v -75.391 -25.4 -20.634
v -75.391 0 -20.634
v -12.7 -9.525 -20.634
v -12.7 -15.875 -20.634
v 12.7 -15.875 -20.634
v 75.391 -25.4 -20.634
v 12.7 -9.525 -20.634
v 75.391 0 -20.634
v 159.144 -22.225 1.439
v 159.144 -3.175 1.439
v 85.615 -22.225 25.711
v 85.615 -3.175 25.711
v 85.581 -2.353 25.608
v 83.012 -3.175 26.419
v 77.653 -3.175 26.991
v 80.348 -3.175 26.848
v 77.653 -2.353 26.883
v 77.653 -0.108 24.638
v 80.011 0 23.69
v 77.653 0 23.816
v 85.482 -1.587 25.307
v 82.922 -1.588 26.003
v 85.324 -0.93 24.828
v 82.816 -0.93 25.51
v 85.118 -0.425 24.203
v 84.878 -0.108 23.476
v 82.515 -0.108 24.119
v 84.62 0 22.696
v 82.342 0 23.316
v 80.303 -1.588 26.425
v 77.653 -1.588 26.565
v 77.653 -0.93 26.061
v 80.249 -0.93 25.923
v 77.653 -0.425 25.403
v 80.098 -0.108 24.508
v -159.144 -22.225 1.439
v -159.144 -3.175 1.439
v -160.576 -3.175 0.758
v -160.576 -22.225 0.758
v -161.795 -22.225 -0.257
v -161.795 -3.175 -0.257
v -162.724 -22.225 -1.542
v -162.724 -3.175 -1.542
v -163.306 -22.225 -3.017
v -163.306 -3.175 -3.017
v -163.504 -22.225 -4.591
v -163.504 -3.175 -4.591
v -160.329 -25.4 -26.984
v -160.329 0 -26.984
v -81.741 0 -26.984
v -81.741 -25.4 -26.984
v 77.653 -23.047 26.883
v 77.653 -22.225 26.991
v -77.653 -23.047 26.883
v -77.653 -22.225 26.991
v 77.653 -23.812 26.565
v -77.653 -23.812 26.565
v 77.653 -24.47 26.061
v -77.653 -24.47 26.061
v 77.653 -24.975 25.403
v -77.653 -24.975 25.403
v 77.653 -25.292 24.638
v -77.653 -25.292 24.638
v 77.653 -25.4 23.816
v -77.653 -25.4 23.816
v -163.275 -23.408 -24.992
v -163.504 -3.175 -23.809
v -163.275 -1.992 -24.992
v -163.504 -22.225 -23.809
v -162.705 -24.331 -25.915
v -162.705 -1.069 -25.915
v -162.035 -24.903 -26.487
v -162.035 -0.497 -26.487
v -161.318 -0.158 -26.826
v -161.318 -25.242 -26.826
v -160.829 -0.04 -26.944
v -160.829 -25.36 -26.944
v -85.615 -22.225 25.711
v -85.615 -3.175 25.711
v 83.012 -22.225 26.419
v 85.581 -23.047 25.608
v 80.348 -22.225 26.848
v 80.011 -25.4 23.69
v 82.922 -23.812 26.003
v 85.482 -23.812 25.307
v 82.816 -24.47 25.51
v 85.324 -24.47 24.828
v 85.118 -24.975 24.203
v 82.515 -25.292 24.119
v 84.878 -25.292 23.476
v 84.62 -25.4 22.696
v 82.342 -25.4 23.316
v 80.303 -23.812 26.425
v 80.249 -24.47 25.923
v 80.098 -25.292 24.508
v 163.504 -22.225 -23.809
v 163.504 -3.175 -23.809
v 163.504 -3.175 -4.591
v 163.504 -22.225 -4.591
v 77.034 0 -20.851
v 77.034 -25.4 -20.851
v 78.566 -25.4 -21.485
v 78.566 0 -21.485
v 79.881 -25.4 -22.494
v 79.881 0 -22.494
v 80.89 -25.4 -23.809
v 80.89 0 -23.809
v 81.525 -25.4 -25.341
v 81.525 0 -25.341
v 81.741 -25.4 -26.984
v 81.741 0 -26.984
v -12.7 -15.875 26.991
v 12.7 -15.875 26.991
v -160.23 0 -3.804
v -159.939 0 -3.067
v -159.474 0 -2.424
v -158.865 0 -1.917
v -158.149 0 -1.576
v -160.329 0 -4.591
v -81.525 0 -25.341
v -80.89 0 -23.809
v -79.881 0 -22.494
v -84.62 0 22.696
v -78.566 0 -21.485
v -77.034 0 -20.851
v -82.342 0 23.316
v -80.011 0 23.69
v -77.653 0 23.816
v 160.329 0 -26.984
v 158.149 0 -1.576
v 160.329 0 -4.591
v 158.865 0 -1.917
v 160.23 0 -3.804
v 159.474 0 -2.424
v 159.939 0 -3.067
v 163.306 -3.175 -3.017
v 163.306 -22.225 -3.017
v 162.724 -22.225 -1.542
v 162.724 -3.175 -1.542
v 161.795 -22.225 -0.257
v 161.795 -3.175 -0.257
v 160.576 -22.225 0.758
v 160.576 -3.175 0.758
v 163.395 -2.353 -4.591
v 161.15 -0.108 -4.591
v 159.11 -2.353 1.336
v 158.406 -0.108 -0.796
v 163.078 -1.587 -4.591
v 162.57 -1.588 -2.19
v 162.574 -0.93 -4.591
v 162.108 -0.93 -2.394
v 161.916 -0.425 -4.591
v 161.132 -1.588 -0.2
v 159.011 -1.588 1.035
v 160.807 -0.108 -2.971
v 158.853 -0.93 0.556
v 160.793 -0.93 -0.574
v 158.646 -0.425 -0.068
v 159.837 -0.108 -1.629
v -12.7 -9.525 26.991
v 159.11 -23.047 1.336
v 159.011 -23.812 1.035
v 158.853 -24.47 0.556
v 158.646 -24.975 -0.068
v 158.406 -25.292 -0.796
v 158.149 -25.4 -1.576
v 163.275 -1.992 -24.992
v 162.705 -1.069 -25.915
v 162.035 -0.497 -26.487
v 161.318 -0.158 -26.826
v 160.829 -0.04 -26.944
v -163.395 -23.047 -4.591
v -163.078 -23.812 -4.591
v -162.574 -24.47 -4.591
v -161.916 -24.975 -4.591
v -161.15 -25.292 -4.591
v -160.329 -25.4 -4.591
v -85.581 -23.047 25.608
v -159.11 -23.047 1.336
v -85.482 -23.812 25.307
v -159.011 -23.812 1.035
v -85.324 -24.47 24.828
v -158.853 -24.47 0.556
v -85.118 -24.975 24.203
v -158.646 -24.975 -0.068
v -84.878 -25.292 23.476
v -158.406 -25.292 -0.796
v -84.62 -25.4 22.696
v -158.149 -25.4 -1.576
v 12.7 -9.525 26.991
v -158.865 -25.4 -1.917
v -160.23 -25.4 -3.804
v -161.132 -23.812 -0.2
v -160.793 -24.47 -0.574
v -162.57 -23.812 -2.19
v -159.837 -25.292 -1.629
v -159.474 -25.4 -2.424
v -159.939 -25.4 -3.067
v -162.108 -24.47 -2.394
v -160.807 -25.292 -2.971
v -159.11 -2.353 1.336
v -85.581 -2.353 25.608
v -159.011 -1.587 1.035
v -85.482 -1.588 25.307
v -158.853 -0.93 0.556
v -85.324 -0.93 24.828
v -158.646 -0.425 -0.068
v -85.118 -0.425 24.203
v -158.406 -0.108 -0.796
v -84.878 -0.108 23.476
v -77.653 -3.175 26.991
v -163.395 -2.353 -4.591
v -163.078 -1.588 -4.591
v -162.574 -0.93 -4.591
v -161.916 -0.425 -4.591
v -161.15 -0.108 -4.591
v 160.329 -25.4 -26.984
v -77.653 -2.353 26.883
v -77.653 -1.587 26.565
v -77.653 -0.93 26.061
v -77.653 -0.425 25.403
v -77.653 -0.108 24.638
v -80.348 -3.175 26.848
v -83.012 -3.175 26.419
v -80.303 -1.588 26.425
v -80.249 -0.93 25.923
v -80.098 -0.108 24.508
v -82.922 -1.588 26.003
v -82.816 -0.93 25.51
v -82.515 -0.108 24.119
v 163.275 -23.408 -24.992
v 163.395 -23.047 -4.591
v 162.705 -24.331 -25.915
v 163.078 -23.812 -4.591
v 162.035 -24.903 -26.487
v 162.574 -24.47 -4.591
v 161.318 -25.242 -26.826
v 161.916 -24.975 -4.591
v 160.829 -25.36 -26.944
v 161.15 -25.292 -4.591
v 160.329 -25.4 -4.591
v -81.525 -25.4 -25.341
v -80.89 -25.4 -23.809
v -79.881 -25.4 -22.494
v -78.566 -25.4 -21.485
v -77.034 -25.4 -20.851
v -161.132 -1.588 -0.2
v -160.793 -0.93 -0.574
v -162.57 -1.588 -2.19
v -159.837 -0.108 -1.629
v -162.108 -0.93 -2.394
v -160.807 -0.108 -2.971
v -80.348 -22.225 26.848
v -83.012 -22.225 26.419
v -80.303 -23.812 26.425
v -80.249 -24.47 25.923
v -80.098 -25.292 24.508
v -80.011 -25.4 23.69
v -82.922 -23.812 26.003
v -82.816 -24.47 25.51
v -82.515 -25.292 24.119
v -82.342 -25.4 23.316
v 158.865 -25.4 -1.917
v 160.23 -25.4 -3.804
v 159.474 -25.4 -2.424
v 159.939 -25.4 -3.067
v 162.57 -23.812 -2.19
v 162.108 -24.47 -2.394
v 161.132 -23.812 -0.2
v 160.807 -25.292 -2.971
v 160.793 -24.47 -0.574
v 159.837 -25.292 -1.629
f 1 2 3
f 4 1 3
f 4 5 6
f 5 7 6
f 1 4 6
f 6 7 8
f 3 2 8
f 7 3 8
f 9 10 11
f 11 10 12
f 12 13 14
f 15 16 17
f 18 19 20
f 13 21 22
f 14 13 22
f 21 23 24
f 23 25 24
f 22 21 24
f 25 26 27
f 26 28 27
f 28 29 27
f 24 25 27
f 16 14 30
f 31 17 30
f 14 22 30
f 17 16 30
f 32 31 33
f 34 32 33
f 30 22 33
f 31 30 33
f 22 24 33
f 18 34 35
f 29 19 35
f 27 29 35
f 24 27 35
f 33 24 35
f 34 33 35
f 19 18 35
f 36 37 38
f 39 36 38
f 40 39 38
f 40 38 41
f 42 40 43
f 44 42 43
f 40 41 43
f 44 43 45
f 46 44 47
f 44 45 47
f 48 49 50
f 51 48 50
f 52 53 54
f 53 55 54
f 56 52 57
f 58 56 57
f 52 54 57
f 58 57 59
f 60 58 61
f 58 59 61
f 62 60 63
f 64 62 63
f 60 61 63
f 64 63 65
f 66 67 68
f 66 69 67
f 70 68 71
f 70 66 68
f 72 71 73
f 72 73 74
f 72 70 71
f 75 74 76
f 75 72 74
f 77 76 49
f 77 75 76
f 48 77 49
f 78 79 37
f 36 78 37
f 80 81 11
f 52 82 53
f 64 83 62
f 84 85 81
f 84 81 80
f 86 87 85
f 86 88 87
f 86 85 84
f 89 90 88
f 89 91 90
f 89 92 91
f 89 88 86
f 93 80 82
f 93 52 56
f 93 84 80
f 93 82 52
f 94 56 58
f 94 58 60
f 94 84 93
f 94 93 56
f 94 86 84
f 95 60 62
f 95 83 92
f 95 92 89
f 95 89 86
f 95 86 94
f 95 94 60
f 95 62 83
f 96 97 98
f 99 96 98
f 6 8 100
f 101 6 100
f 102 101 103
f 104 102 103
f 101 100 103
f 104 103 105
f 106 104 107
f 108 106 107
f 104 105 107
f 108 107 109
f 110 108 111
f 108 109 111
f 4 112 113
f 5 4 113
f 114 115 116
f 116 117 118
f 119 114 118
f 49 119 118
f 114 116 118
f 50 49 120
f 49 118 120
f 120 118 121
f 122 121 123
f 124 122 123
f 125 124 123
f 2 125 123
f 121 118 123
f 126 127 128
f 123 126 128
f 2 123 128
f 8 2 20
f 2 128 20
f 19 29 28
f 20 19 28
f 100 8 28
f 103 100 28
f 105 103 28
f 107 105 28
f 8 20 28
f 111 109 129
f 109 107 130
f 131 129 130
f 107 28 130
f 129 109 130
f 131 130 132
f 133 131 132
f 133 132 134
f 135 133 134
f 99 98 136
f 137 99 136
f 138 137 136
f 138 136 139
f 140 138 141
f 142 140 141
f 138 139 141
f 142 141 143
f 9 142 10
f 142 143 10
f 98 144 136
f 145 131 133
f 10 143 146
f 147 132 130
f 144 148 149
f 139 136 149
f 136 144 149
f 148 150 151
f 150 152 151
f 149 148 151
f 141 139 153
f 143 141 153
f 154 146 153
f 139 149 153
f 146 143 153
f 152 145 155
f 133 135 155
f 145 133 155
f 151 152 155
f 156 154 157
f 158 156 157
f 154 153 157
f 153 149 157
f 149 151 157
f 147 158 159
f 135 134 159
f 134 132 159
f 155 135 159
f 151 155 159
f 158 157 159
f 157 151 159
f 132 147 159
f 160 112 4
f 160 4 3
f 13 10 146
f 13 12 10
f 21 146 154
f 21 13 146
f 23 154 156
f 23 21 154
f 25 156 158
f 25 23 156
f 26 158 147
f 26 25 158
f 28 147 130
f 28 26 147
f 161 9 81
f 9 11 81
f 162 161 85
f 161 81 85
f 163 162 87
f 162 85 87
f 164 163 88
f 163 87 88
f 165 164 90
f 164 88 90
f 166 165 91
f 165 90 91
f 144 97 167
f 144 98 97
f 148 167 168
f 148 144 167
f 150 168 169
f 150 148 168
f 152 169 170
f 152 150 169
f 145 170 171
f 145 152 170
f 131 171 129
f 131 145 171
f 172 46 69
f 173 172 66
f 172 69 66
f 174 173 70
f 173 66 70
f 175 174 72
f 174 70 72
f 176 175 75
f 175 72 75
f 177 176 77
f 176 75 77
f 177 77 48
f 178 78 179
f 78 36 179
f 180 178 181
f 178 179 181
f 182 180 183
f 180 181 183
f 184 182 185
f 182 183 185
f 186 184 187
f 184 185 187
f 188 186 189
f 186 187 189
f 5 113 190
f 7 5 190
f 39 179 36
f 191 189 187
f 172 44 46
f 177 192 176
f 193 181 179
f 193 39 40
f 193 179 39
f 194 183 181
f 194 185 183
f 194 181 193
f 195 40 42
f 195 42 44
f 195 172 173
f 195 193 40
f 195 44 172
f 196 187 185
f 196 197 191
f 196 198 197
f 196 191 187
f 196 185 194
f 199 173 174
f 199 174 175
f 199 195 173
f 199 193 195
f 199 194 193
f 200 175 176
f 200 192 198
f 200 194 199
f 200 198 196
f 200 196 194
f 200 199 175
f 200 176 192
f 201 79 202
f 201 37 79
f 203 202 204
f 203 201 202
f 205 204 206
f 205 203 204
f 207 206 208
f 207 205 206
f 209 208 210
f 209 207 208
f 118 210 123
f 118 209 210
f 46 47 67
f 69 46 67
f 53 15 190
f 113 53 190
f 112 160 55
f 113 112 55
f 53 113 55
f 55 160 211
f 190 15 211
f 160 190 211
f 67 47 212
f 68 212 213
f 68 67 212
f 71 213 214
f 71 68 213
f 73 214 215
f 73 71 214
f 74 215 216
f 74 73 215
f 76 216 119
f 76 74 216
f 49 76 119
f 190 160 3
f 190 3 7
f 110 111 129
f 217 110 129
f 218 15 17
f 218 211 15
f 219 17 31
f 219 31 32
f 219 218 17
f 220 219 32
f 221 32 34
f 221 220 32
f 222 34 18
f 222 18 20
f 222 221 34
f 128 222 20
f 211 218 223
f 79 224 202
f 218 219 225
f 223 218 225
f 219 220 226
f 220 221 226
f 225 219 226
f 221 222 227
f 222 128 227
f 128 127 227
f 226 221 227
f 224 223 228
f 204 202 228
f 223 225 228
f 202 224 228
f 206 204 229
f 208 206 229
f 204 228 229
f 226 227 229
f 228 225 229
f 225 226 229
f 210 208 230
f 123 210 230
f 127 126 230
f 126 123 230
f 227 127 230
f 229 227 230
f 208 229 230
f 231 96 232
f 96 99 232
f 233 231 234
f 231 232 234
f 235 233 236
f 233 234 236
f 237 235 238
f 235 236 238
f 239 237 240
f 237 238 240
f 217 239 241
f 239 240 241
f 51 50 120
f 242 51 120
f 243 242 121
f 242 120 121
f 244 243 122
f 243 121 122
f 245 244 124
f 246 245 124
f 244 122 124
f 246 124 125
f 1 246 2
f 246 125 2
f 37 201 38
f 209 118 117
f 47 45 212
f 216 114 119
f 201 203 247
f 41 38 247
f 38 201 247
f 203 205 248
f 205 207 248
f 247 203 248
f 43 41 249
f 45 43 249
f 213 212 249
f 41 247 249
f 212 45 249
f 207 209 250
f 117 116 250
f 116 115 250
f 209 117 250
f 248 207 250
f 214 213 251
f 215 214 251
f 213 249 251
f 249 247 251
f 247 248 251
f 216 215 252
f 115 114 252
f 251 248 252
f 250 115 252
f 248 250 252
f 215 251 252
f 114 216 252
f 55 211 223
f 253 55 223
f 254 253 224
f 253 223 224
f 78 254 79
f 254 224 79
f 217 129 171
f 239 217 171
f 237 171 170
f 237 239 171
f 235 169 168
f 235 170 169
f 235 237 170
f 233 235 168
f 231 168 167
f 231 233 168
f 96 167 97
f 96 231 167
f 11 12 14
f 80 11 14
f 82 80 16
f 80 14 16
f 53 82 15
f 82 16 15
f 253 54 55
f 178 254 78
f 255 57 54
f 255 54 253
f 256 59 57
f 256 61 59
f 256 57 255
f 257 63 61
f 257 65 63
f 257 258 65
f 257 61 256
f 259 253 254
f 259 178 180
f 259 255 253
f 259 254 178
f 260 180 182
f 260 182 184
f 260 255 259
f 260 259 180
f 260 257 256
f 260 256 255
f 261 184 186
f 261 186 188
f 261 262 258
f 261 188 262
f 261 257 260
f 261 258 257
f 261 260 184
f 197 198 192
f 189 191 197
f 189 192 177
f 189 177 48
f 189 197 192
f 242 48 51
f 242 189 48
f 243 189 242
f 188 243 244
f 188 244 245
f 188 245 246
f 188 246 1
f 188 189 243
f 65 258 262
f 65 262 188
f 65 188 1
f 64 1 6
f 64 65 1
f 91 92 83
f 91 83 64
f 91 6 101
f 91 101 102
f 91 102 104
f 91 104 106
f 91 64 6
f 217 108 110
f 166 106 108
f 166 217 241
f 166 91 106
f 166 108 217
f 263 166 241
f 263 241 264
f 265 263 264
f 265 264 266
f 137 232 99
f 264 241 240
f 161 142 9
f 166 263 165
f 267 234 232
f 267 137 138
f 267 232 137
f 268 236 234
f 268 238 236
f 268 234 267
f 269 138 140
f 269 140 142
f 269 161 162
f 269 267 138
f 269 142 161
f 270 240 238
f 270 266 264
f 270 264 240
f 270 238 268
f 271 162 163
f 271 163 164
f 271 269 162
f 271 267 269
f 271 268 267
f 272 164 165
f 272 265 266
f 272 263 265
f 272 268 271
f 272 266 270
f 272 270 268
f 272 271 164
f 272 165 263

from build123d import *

# Parameters (mm, degrees)
F1_DEPTH = 25.4
F2_R     = 3.175
F3_W     = 25.4
F3_H     = 6.35
F4_DEPTH = 53.976


with BuildPart() as f1:
    # F0 (on Front) → F1 (new body)
    with BuildSketch(Plane.XZ):
        with BuildLine():
            Line((-85.615239, 25.710709), (-159.144036, 1.439067))
            ThreePointArc((-159.144036, 1.439067), (-162.299532, -0.870485), (-163.503562, -4.590901))
            Line((-163.503562, -4.590901), (-163.503562, -26.984162))
            Line((-163.503562, -26.984162), (-81.740962, -26.984162))
            ThreePointArc((-81.740962, -26.984162), (-79.88109, -22.494034), (-75.390962, -20.634162))
            Line((-75.390962, -20.634162), (0, -20.634162))
            Line((0, -20.634162), (75.390962, -20.634162))
            ThreePointArc((75.390962, -20.634162), (79.88109, -22.494034), (81.740962, -26.984162))
            Line((81.740962, -26.984162), (163.503562, -26.984162))
            Line((163.503562, -26.984162), (163.503562, -4.590901))
            ThreePointArc((163.503562, -4.590901), (162.299532, -0.870485), (159.144036, 1.439067))
            Line((159.144036, 1.439067), (85.615239, 25.710709))
            ThreePointArc((85.615239, 25.710709), (81.685416, 26.668764), (77.65334, 26.990838))
            Line((77.65334, 26.990838), (0, 26.990838))
            Line((0, 26.990838), (-77.65334, 26.990838))
            ThreePointArc((-77.65334, 26.990838), (-81.685416, 26.668764), (-85.615239, 25.710709))
        make_face()
    extrude(amount=F1_DEPTH)

    # F2
    f2_edges = [f1.edges().sort_by_distance(p)[0] for p in [
        (-163.503562, -25.4, -15.787532),
        (-162.299532, -25.4, -0.870485),
        (-122.379638, -25.4, 13.574888),
        (122.379638, 0, 13.574888),
        (-163.503562, -12.7, -26.984162),
        (163.503562, -12.7, -26.984162),
    ]]
    fillet(f2_edges, radius=F2_R)

    # F3 (on face) → F4 (cut, through all)
    with BuildSketch(Plane.XY.offset(26.990838)):
        with Locations((0, -12.7)):
            Rectangle(F3_W, F3_H)
    extrude(amount=-F4_DEPTH, mode=Mode.SUBTRACT)


solid = f1.part
